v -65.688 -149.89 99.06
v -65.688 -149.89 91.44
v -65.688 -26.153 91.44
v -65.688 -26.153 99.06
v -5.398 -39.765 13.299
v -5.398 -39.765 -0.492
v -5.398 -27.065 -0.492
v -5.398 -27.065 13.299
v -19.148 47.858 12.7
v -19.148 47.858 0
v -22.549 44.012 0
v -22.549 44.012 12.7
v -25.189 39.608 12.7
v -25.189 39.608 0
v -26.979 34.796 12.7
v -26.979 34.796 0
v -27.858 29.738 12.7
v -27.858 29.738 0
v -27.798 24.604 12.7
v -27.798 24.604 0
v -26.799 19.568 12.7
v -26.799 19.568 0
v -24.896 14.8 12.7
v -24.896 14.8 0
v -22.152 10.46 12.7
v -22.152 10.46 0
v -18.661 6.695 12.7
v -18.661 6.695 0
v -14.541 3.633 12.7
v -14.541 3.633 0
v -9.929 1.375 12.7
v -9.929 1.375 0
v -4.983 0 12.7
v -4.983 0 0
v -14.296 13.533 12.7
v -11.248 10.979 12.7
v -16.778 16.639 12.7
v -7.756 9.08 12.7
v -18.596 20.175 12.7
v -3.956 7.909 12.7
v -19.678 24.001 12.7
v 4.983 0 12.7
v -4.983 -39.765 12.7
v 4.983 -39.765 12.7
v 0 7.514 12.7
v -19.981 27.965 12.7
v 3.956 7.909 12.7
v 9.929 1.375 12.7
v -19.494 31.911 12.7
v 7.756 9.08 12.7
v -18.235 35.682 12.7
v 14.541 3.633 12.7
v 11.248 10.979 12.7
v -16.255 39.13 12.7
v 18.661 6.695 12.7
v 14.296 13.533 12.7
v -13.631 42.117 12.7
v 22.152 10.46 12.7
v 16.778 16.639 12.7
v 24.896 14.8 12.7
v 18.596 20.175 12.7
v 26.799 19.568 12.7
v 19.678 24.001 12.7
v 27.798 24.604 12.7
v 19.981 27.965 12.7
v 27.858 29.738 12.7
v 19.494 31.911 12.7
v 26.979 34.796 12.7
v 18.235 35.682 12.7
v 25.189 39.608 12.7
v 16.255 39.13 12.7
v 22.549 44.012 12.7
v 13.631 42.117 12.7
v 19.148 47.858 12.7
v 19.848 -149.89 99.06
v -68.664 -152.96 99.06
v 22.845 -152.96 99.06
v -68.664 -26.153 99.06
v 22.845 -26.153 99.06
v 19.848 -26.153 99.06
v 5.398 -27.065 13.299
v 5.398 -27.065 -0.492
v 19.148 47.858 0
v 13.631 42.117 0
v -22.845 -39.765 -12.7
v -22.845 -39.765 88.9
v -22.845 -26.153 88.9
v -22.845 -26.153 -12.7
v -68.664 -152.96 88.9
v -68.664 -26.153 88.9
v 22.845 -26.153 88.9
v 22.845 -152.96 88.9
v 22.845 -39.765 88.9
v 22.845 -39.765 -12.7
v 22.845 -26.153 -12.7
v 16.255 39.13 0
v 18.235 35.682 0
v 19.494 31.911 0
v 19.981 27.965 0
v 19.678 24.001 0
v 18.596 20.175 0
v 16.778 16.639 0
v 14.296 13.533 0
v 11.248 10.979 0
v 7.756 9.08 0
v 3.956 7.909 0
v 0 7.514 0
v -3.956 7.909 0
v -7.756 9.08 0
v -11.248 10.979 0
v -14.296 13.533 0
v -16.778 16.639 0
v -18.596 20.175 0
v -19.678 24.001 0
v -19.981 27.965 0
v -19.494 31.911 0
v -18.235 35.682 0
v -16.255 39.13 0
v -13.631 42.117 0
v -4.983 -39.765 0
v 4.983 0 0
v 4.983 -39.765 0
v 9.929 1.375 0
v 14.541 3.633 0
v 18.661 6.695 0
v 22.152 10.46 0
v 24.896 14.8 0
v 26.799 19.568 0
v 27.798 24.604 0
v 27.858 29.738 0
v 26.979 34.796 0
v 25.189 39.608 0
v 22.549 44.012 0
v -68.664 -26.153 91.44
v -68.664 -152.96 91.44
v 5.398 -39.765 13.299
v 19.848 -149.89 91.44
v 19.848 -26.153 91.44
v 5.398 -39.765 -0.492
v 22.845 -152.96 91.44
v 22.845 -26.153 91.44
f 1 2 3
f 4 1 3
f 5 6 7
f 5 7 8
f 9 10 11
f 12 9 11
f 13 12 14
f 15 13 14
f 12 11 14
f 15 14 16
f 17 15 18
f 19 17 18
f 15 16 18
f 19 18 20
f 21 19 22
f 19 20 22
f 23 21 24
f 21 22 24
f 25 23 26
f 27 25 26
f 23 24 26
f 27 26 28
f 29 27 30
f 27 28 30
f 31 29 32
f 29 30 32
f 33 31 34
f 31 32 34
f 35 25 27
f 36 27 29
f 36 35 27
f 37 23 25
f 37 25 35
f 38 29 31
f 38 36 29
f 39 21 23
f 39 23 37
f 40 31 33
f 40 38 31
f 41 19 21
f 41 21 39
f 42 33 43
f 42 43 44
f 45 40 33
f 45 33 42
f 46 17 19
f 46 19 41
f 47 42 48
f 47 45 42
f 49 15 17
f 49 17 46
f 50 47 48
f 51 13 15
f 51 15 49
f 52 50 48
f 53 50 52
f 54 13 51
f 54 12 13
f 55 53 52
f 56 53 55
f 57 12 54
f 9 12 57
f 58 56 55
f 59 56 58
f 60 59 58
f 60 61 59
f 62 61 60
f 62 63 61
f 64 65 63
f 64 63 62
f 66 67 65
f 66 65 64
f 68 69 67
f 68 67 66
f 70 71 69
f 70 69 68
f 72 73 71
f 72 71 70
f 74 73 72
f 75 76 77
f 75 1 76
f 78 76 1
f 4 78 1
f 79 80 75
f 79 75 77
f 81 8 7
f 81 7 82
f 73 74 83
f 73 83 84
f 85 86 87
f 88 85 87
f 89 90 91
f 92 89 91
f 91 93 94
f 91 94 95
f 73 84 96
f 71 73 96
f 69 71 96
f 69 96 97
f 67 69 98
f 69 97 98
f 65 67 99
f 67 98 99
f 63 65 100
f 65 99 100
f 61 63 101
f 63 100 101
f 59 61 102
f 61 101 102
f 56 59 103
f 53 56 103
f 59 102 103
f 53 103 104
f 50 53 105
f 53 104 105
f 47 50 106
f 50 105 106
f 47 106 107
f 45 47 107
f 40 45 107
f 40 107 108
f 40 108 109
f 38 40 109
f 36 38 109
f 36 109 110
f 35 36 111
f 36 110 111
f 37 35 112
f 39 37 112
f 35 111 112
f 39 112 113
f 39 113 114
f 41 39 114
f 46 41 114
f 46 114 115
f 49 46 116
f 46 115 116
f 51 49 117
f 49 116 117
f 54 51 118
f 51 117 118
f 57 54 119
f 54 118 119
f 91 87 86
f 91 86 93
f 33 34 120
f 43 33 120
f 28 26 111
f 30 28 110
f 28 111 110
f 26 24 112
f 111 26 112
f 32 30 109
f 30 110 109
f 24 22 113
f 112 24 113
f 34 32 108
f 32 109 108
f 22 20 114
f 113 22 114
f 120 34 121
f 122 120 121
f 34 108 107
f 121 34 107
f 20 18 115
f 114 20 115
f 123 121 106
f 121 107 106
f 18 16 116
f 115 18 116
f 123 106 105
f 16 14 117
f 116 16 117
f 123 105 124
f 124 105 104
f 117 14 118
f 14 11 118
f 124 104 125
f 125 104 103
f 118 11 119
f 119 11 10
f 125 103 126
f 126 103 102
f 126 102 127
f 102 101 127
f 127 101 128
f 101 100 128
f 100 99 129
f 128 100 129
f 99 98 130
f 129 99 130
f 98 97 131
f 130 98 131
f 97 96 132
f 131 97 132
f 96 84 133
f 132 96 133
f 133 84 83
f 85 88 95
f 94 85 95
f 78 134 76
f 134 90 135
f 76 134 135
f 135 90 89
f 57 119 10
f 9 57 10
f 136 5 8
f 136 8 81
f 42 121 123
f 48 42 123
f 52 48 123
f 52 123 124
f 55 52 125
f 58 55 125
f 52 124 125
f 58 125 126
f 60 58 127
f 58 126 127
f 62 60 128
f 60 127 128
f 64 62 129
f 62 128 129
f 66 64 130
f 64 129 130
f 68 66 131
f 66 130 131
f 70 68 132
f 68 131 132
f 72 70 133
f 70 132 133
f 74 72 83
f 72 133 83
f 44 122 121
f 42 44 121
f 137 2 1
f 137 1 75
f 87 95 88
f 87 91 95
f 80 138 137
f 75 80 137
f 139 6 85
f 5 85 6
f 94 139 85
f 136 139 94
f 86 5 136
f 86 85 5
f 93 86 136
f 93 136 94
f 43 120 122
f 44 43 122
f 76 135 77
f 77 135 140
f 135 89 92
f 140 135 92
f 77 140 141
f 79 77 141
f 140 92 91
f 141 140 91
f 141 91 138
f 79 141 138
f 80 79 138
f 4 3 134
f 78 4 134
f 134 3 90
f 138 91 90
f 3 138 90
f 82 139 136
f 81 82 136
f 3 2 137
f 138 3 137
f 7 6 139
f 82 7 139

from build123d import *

# Parameters (mm, degrees)
F1_DEPTH      = 12.7
F2_W          = 17.8625439294
F2_H          = 13.6123597622
F2_W_2        = 9.9653182551
F3_DEPTH      = 76.2
F3_DEPTH_BACK = 25.4
F4_W          = 10.7960565947
F4_H          = 13.7910920894
F5_DEPTH      = 12.7
F6_W          = 91.5096271783
F6_H          = 126.8072500825
F7_DEPTH      = 2.54
F8_W          = 85.5362936854
F8_H          = 3.070384264
F9_DEPTH      = 7.62


with BuildPart() as f1:
    # F0 (on Top) → F1 (new body)
    with BuildSketch(Plane.XY):
        with BuildLine():
            ThreePointArc((-19.1484129168, 47.8582315663), (-26.7988757538, 19.5681342696), (-4.9826591276, 0))
            Line((-4.9826591276, 0), (-4.9826591276, -39.7654548287))
            Line((-4.9826591276, -39.7654548287), (4.9826591276, -39.7654548287))
            Line((4.9826591276, -39.7654548287), (4.9826591276, 0))
            ThreePointArc((4.9826591276, 0), (26.7988757538, 19.5681342696), (19.1484129168, 47.8582315663))
            Line((19.1484129168, 47.8582315663), (13.6314762534, 42.1173290091))
            ThreePointArc((13.6314762534, 42.1173290091), (18.5958954805, 20.1749282956), (0, 7.5136851253))
            ThreePointArc((0, 7.5136851253), (-18.5958954805, 20.1749282956), (-13.6314762534, 42.1173290091))
            Line((-13.6314762534, 42.1173290091), (-19.1484129168, 47.8582315663))
        make_face()
    extrude(amount=F1_DEPTH)


with BuildPart() as f3:
    # F2 (on face) → F3 (new body, two sides)
    with BuildSketch(Plane.XY.offset(12.7)) as f3_sk:
        with Locations((-13.9139310922, -32.9592749476)):
            Rectangle(F2_W, F2_H)
        with Locations((0, -32.9592749476)):
            Rectangle(F2_W_2, F2_H)
        with Locations((13.9139310922, -32.9592749476)):
            Rectangle(F2_W, F2_H)
    extrude(amount=F3_DEPTH)
    extrude(f3_sk.sketch, amount=-F3_DEPTH_BACK)

    # F4 (on face) → F5 (cut)
    with BuildSketch(Plane.XZ.offset(39.7654548287)):
        with Locations((-0.0001469161, 6.4032858354)):
            Rectangle(F4_W, F4_H)
    extrude(amount=-F5_DEPTH, mode=Mode.SUBTRACT)


with BuildPart() as f7:
    # F6 (on face) → F7 (new body)
    with BuildSketch(Plane.XY.offset(88.9)):
        with Locations((-22.9096105322, -89.5567201078)):
            Rectangle(F6_W, F6_H)
    extrude(amount=F7_DEPTH)

    # F8 (on face) → F9 (join)
    with BuildSketch(Plane.XY.offset(91.44)):
        Polygon((-65.6880363822, -26.1530950665), (-68.6644241214, -26.1530950665), (-68.6644241214, -152.960345149), (-65.6880363822, -152.960345149), (-65.6880363822, -149.889960885), align=None)
        with Locations((-22.9198895395, -151.425153017)):
            Rectangle(F8_W, F8_H)
        Polygon((19.8482573032, -26.1530950665), (19.8482573032, -149.889960885), (19.8482573032, -152.960345149), (22.8452030569, -152.960345149), (22.8452030569, -26.1530950665), align=None)
    extrude(amount=F9_DEPTH)


solid = Compound([f1.part, f3.part, f7.part])
